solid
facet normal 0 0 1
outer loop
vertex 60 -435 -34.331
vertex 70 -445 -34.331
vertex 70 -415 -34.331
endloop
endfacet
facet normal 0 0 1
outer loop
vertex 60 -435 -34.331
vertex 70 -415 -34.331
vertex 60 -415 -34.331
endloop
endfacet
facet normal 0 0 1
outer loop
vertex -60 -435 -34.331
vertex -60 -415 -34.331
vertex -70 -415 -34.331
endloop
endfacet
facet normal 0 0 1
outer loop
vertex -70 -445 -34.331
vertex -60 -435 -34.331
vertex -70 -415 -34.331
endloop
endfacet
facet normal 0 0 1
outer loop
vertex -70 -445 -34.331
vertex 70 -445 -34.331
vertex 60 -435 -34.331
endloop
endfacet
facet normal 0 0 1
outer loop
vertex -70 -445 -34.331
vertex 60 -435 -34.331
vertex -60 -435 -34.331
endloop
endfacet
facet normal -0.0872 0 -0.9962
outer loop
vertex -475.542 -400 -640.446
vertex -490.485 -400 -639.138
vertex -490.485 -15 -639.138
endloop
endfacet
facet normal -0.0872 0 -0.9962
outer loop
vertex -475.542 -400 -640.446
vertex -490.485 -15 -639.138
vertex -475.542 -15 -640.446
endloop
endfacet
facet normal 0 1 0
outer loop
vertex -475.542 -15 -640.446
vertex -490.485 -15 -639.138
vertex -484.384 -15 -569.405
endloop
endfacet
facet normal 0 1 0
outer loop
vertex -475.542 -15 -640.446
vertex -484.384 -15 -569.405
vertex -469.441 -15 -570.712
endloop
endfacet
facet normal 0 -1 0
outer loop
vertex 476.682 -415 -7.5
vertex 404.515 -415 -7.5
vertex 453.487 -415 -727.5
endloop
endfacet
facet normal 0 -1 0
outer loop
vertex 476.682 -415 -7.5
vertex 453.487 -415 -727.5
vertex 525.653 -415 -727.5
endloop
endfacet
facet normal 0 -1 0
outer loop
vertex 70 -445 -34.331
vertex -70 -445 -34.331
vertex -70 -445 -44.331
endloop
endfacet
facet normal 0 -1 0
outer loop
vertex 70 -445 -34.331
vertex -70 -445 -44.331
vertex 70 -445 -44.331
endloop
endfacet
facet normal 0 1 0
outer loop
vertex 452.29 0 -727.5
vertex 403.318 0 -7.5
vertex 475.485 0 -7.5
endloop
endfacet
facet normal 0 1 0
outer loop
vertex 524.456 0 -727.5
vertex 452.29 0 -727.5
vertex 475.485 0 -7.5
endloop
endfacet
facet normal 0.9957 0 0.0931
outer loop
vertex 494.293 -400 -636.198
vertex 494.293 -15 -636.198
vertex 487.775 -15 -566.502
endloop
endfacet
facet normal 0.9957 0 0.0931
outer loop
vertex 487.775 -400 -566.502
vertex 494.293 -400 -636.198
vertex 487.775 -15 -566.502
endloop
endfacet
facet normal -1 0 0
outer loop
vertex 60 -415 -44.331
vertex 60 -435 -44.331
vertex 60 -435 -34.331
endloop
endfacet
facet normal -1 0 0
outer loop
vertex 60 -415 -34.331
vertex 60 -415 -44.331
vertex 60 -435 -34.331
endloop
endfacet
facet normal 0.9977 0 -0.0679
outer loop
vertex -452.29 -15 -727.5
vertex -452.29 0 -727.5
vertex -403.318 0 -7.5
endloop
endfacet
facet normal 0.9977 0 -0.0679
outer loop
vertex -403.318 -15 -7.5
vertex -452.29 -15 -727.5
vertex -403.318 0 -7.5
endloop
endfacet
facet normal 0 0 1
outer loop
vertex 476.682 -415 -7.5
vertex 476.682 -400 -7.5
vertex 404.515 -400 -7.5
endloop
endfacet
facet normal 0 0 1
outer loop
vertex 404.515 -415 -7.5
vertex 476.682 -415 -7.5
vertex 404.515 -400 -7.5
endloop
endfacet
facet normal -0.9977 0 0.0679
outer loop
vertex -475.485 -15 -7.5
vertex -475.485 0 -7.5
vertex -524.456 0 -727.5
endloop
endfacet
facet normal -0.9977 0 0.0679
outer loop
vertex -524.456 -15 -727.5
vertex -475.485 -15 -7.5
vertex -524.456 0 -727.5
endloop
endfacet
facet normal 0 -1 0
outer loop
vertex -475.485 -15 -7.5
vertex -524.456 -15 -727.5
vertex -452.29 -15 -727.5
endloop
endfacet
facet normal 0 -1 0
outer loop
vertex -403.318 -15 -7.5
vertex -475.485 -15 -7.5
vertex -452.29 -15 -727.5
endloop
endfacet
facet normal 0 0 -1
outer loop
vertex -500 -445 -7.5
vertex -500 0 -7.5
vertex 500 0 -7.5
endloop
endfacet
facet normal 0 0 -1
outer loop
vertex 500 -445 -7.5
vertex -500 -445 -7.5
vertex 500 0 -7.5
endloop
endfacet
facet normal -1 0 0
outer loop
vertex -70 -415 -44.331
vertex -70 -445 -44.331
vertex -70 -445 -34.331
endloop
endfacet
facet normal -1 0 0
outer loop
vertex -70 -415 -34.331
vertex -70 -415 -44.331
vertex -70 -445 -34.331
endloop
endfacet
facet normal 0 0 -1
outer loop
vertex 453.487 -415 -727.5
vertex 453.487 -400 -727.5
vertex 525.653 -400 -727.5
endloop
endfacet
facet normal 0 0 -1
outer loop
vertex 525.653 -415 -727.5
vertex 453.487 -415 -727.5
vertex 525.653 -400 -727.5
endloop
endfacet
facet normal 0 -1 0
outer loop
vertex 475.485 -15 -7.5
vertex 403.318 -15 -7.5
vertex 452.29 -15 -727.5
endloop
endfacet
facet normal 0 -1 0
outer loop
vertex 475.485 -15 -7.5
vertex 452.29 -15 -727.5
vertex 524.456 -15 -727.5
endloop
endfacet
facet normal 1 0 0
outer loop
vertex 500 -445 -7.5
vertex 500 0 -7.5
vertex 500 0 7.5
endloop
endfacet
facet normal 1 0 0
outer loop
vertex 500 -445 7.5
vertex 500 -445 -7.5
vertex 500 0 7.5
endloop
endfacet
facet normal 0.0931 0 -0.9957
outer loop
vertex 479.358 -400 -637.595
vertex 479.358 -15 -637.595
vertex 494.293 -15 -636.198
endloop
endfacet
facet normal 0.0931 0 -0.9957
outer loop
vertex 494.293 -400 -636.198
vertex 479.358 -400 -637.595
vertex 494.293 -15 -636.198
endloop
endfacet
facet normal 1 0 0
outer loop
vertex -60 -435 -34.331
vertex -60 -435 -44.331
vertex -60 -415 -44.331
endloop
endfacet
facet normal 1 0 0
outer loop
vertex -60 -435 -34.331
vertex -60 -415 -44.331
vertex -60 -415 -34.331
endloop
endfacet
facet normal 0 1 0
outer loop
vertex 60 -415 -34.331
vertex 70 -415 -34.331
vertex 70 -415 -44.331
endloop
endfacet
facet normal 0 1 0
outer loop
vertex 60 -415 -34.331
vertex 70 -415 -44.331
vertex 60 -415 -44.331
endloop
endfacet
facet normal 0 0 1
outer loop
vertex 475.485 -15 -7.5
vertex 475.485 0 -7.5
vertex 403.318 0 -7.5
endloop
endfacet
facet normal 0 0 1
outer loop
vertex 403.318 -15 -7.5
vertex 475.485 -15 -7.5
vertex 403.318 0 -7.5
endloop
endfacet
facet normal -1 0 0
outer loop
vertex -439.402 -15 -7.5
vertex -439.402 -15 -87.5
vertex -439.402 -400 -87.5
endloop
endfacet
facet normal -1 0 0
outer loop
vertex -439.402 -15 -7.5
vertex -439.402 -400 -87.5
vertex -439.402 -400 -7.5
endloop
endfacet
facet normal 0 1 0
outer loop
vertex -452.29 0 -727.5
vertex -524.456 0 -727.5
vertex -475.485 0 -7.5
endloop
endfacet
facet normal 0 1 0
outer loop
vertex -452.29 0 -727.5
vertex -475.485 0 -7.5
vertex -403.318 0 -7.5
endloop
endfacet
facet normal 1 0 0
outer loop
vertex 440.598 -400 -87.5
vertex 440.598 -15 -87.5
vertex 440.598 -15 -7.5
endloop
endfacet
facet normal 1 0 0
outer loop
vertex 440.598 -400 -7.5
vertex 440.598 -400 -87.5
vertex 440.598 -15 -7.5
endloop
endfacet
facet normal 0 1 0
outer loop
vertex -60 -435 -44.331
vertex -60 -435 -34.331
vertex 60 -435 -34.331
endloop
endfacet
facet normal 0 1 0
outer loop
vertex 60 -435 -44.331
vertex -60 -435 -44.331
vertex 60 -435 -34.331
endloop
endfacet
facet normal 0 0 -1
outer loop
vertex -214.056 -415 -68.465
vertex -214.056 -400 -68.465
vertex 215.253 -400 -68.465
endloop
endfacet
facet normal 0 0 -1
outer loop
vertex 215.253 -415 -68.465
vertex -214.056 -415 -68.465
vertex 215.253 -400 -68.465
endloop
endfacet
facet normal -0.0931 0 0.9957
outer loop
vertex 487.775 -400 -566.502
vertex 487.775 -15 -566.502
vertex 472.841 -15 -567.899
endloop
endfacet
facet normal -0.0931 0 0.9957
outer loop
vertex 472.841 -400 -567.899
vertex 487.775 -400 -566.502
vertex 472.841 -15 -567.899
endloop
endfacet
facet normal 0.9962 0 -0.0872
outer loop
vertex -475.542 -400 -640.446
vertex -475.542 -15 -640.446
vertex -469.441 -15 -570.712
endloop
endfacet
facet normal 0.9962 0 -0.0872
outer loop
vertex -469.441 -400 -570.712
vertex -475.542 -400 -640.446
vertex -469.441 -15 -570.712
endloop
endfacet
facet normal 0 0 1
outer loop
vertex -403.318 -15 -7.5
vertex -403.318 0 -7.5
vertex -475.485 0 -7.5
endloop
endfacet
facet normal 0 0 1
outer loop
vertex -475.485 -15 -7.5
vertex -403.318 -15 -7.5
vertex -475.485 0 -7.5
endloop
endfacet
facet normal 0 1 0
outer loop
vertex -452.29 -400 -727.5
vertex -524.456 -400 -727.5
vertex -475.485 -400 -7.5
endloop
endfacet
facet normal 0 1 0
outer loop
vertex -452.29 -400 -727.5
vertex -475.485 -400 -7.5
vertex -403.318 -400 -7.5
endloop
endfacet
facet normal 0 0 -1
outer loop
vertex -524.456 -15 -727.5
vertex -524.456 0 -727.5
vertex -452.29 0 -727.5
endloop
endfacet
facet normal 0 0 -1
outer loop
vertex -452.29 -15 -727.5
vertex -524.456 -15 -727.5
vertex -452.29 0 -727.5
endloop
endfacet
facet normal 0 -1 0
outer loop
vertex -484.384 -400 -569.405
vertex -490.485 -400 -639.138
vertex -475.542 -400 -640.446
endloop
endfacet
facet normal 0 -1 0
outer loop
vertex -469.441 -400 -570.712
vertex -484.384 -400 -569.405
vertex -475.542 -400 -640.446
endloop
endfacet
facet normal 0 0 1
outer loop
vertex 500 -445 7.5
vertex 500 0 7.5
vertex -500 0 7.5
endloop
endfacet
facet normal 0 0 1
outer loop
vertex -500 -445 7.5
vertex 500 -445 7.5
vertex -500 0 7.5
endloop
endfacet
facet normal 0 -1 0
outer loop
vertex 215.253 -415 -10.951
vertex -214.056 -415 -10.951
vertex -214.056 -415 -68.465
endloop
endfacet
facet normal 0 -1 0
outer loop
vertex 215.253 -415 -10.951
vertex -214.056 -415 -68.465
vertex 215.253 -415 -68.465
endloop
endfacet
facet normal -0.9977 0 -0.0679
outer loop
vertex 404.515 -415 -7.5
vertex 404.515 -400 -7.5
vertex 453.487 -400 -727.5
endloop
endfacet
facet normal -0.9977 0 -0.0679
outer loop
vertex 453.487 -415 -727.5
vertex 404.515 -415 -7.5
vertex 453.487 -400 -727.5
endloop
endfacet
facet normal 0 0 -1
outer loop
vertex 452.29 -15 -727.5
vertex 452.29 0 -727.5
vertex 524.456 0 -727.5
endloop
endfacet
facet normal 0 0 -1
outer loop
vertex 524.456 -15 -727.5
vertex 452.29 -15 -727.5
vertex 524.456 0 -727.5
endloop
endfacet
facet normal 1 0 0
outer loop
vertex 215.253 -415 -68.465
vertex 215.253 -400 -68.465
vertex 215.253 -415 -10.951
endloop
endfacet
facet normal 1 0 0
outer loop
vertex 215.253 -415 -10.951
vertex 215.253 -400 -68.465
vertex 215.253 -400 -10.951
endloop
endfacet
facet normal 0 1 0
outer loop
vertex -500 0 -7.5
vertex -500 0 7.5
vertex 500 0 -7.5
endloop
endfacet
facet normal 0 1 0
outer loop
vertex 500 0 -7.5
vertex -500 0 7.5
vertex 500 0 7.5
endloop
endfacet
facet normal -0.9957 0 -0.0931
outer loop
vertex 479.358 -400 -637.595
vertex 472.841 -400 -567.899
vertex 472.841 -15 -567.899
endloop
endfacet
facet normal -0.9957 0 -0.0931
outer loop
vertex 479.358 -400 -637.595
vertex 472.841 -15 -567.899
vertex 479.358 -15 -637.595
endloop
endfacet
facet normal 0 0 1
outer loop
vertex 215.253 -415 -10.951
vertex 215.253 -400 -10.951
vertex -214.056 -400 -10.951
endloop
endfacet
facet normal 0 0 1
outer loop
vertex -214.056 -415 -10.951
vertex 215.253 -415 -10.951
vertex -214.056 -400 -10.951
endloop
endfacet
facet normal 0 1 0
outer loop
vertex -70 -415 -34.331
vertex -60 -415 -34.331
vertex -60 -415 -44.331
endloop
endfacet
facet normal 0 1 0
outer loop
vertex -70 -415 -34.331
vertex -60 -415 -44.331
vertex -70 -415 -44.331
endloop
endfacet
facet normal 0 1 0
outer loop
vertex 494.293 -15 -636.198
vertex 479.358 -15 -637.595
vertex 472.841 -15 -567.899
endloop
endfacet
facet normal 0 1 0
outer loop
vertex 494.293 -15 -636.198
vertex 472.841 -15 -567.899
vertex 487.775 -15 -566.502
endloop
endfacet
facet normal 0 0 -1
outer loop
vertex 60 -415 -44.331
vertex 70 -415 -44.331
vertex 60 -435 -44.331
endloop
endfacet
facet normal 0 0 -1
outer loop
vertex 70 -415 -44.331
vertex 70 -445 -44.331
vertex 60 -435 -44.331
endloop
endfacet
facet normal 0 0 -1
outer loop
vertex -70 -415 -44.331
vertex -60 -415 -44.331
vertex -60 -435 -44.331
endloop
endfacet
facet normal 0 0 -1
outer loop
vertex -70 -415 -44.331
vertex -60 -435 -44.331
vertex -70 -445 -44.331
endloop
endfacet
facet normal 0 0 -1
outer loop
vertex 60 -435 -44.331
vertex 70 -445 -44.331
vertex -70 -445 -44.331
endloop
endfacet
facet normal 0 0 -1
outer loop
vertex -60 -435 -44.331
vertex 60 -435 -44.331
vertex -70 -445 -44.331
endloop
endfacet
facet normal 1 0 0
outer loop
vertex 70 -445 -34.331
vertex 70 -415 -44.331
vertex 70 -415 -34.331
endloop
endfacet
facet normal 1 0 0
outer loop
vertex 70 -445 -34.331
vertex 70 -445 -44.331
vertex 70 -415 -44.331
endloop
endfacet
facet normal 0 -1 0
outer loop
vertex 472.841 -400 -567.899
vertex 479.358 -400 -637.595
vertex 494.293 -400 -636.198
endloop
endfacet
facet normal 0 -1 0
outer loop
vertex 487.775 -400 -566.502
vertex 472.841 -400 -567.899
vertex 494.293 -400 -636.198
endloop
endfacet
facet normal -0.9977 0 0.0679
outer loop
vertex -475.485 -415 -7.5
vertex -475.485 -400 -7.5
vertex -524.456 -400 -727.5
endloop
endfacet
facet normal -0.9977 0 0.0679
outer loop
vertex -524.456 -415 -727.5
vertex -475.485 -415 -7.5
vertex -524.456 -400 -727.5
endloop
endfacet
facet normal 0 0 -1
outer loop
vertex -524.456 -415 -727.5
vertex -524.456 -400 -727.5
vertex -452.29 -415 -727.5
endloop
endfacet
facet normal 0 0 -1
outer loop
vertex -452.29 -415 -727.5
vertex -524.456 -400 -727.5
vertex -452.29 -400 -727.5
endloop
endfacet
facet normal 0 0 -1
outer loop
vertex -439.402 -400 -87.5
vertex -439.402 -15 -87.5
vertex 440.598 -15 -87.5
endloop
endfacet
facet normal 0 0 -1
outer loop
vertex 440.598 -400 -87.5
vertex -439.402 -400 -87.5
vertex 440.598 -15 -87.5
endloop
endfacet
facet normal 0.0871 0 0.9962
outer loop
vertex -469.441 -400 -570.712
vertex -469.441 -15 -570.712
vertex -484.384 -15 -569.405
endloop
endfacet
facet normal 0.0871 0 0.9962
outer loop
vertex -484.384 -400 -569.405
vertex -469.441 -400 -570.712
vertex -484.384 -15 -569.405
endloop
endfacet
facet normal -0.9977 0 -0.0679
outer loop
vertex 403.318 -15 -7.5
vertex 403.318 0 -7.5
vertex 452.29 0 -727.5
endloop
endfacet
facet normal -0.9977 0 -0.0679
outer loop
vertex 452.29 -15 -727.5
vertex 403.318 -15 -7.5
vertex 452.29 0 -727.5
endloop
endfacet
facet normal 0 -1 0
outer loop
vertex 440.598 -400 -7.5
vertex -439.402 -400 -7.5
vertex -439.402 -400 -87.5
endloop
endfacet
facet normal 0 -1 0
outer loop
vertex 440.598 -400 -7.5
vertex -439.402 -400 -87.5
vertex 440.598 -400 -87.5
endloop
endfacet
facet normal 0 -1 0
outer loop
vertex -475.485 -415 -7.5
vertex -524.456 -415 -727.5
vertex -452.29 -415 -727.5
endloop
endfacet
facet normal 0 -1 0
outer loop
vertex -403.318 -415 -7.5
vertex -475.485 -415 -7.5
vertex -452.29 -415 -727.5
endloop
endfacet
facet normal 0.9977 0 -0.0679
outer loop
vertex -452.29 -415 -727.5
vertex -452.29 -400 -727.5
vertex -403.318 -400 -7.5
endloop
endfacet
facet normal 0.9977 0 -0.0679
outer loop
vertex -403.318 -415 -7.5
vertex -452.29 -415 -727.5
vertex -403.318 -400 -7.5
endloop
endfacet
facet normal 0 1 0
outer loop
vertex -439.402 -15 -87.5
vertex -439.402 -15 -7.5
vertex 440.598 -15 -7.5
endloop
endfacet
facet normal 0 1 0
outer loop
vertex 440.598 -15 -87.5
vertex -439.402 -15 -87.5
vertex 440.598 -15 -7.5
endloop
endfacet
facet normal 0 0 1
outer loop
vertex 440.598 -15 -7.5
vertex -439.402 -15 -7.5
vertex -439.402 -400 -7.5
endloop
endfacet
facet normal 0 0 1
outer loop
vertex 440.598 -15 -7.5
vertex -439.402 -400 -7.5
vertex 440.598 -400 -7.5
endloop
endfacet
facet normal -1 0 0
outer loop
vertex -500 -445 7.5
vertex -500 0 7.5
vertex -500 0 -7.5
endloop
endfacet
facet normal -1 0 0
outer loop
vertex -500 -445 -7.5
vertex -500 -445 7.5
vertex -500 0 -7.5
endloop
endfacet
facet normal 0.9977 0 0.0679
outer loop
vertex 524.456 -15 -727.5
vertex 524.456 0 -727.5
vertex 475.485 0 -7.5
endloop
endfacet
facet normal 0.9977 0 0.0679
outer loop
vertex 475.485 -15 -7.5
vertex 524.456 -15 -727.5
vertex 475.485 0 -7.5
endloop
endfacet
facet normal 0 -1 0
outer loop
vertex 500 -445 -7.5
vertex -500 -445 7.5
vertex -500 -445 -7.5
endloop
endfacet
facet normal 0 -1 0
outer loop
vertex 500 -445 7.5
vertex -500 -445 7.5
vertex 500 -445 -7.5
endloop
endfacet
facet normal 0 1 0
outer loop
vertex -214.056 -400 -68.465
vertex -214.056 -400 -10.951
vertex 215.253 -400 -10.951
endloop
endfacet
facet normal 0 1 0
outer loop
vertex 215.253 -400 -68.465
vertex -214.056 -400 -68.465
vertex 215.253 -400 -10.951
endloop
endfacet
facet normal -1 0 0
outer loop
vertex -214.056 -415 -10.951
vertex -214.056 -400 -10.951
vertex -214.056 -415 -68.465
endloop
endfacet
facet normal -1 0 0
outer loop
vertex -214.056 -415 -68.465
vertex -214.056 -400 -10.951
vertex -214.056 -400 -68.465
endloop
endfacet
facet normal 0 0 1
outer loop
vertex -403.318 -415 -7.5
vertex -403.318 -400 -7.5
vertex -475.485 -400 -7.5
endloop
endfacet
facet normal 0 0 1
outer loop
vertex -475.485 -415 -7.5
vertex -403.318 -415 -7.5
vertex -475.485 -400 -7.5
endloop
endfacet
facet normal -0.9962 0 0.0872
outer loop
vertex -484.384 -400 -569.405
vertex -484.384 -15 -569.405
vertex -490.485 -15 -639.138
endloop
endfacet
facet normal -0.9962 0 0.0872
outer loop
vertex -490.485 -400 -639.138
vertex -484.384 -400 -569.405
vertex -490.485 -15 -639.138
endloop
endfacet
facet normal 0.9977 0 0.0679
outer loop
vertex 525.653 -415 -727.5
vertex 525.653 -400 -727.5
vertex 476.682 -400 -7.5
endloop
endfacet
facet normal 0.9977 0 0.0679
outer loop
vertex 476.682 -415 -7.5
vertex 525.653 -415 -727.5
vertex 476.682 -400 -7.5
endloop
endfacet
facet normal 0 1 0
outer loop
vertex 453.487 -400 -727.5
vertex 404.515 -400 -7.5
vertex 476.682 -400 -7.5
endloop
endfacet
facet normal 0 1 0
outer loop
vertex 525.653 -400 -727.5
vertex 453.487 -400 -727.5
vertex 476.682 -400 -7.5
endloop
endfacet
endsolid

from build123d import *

# Parameters (mm, degrees)
F1_DEPTH  = 445
F2_DEPTH  = 15
F3_W      = 880
F3_H      = 80
F4_DEPTH  = 385
F6_DEPTH  = 15
F7_W      = 10
F7_H      = 10
F8_DEPTH  = 20
F10_W     = 40.9078299999
F10_H     = 28.1210877001
F11_DEPTH = 30
F12_W     = 140
F12_H     = 10
F13_DEPTH = 10
F15_W     = 10
F15_H     = 10
F16_DEPTH = 20


with BuildPart() as f1:
    # F0 (on Front) → F1 (new body)
    with BuildSketch(Plane.XZ):
        Polygon((500, -7.5), (500, 7.5), (-500, 7.5), (-500, -7.5), (-475.4847236312, -7.5), (-403.318375349, -7.5), (403.318375349, -7.5), (475.4847236312, -7.5), align=None)
    extrude(amount=F1_DEPTH)


with BuildPart() as f2:
    # F0 (on Front) → F2 (new body)
    with BuildSketch(Plane.XZ):
        Polygon((-403.318375349, -7.5), (-475.4847236312, -7.5), (-524.4559645653, -727.5), (-452.2896162831, -727.5), align=None)
    extrude(amount=F2_DEPTH)


with BuildPart() as f2b:
    # F0 (on Front) → F2, piece 2 (new body)
    with BuildSketch(Plane.XZ):
        Polygon((524.4559645653, -727.5), (475.4847236312, -7.5), (403.318375349, -7.5), (452.2896162831, -727.5), align=None)
    extrude(amount=F2_DEPTH)


with BuildPart() as f4:
    # F3 (on face) → F4 (new body)
    with BuildSketch(Plane.XZ.offset(15)):
        with Locations((0.5984505099, -47.5)):
            Rectangle(F3_W, F3_H)
    extrude(amount=F4_DEPTH)


with BuildPart() as f4b:
    # F3 (on face) → F4, piece 2 (new body)
    with BuildSketch(Plane.XZ.offset(15)):
        Polygon((-475.5418031599, -640.4457963005), (-469.4409011675, -570.7121674341), (-484.3838216389, -569.4048312929), (-490.4847236312, -639.1384601593), align=None)
    extrude(amount=F4_DEPTH)


with BuildPart() as f4c:
    # F3 (on face) → F4, piece 3 (new body)
    with BuildSketch(Plane.XZ.offset(15)):
        Polygon((487.775438711, -566.502135879), (472.8405915526, -567.898681744), (479.3578055892, -637.5946351502), (494.2926527476, -636.1980892852), align=None)
    extrude(amount=F4_DEPTH)


with BuildPart() as f6:
    # F5 (on face) → F6 (new body)
    with BuildSketch(Plane.XZ.offset(400)):
        Polygon((-403.318375349, -7.5), (-475.4847236312, -7.5), (-524.4559645658, -727.5), (-452.2896162837, -727.5), align=None)
    extrude(amount=F6_DEPTH)


with BuildPart() as f6b:
    # F5 (on face) → F6, piece 2 (new body)
    with BuildSketch(Plane.XZ.offset(400)):
        Polygon((525.652865585, -727.5), (476.681624651, -7.5), (404.5152763688, -7.5), (453.4865173028, -727.5), align=None)
    extrude(amount=F6_DEPTH)


with BuildPart() as f6c:
    # F5 (on face) → F6, piece 3 (new body)
    with BuildSketch(Plane.XZ.offset(400)):
        Polygon((215.2531991564, -10.9507972375), (0.5984505099, -10.9507972375), (-214.0562981367, -10.9507972375), (-214.0562981367, -68.4654787183), (0.5984505099, -68.4654787183), (215.2531991564, -68.4654787183), align=None)
    extrude(amount=F6_DEPTH)


with BuildPart() as f8:
    # F7 (on face) → F8 (new body)
    with BuildSketch(Plane.XZ.offset(415)):
        with Locations((-37.01236099, -39.2755609937)):
            Rectangle(F7_W, F7_H)
    extrude(amount=F8_DEPTH)


with BuildPart() as f8b:
    # F7 (on face) → F8, piece 2 (new body)
    with BuildSketch(Plane.XZ.offset(415)):
        with Locations((37.01236099, -39.2755609937)):
            Rectangle(F7_W, F7_H)
    extrude(amount=F8_DEPTH)


with BuildPart() as f11:
    # F10 (on face) → F11 (new body)
    with BuildSketch(Plane.XZ.offset(415)):
        with Locations((-175.1520335674, -39.3307115883)):
            Rectangle(F10_W, F10_H)
    extrude(amount=F11_DEPTH)


with BuildPart() as f13:
    # F12 (on face) → F13 (new body)
    with BuildSketch(Plane.XZ.offset(445)):
        with Locations((0, -39.3307115883)):
            Rectangle(F12_W, F12_H)
    extrude(amount=-F13_DEPTH)

    # F15 (on face) → F16 (join)
    with BuildSketch(Plane(origin=(0, -435, 0), x_dir=(-1, 0, 0), z_dir=(0, 1, 0))):
        with Locations((-65, -39.3307115883)):
            Rectangle(F15_W, F15_H)
        with Locations((65, -39.3307115883)):
            Rectangle(F15_W, F15_H)
    extrude(amount=F16_DEPTH)


solid = Compound([f1.part, f2.part, f2b.part, f4.part, f4b.part, f4c.part, f6.part, f6b.part, f6c.part, f13.part])
